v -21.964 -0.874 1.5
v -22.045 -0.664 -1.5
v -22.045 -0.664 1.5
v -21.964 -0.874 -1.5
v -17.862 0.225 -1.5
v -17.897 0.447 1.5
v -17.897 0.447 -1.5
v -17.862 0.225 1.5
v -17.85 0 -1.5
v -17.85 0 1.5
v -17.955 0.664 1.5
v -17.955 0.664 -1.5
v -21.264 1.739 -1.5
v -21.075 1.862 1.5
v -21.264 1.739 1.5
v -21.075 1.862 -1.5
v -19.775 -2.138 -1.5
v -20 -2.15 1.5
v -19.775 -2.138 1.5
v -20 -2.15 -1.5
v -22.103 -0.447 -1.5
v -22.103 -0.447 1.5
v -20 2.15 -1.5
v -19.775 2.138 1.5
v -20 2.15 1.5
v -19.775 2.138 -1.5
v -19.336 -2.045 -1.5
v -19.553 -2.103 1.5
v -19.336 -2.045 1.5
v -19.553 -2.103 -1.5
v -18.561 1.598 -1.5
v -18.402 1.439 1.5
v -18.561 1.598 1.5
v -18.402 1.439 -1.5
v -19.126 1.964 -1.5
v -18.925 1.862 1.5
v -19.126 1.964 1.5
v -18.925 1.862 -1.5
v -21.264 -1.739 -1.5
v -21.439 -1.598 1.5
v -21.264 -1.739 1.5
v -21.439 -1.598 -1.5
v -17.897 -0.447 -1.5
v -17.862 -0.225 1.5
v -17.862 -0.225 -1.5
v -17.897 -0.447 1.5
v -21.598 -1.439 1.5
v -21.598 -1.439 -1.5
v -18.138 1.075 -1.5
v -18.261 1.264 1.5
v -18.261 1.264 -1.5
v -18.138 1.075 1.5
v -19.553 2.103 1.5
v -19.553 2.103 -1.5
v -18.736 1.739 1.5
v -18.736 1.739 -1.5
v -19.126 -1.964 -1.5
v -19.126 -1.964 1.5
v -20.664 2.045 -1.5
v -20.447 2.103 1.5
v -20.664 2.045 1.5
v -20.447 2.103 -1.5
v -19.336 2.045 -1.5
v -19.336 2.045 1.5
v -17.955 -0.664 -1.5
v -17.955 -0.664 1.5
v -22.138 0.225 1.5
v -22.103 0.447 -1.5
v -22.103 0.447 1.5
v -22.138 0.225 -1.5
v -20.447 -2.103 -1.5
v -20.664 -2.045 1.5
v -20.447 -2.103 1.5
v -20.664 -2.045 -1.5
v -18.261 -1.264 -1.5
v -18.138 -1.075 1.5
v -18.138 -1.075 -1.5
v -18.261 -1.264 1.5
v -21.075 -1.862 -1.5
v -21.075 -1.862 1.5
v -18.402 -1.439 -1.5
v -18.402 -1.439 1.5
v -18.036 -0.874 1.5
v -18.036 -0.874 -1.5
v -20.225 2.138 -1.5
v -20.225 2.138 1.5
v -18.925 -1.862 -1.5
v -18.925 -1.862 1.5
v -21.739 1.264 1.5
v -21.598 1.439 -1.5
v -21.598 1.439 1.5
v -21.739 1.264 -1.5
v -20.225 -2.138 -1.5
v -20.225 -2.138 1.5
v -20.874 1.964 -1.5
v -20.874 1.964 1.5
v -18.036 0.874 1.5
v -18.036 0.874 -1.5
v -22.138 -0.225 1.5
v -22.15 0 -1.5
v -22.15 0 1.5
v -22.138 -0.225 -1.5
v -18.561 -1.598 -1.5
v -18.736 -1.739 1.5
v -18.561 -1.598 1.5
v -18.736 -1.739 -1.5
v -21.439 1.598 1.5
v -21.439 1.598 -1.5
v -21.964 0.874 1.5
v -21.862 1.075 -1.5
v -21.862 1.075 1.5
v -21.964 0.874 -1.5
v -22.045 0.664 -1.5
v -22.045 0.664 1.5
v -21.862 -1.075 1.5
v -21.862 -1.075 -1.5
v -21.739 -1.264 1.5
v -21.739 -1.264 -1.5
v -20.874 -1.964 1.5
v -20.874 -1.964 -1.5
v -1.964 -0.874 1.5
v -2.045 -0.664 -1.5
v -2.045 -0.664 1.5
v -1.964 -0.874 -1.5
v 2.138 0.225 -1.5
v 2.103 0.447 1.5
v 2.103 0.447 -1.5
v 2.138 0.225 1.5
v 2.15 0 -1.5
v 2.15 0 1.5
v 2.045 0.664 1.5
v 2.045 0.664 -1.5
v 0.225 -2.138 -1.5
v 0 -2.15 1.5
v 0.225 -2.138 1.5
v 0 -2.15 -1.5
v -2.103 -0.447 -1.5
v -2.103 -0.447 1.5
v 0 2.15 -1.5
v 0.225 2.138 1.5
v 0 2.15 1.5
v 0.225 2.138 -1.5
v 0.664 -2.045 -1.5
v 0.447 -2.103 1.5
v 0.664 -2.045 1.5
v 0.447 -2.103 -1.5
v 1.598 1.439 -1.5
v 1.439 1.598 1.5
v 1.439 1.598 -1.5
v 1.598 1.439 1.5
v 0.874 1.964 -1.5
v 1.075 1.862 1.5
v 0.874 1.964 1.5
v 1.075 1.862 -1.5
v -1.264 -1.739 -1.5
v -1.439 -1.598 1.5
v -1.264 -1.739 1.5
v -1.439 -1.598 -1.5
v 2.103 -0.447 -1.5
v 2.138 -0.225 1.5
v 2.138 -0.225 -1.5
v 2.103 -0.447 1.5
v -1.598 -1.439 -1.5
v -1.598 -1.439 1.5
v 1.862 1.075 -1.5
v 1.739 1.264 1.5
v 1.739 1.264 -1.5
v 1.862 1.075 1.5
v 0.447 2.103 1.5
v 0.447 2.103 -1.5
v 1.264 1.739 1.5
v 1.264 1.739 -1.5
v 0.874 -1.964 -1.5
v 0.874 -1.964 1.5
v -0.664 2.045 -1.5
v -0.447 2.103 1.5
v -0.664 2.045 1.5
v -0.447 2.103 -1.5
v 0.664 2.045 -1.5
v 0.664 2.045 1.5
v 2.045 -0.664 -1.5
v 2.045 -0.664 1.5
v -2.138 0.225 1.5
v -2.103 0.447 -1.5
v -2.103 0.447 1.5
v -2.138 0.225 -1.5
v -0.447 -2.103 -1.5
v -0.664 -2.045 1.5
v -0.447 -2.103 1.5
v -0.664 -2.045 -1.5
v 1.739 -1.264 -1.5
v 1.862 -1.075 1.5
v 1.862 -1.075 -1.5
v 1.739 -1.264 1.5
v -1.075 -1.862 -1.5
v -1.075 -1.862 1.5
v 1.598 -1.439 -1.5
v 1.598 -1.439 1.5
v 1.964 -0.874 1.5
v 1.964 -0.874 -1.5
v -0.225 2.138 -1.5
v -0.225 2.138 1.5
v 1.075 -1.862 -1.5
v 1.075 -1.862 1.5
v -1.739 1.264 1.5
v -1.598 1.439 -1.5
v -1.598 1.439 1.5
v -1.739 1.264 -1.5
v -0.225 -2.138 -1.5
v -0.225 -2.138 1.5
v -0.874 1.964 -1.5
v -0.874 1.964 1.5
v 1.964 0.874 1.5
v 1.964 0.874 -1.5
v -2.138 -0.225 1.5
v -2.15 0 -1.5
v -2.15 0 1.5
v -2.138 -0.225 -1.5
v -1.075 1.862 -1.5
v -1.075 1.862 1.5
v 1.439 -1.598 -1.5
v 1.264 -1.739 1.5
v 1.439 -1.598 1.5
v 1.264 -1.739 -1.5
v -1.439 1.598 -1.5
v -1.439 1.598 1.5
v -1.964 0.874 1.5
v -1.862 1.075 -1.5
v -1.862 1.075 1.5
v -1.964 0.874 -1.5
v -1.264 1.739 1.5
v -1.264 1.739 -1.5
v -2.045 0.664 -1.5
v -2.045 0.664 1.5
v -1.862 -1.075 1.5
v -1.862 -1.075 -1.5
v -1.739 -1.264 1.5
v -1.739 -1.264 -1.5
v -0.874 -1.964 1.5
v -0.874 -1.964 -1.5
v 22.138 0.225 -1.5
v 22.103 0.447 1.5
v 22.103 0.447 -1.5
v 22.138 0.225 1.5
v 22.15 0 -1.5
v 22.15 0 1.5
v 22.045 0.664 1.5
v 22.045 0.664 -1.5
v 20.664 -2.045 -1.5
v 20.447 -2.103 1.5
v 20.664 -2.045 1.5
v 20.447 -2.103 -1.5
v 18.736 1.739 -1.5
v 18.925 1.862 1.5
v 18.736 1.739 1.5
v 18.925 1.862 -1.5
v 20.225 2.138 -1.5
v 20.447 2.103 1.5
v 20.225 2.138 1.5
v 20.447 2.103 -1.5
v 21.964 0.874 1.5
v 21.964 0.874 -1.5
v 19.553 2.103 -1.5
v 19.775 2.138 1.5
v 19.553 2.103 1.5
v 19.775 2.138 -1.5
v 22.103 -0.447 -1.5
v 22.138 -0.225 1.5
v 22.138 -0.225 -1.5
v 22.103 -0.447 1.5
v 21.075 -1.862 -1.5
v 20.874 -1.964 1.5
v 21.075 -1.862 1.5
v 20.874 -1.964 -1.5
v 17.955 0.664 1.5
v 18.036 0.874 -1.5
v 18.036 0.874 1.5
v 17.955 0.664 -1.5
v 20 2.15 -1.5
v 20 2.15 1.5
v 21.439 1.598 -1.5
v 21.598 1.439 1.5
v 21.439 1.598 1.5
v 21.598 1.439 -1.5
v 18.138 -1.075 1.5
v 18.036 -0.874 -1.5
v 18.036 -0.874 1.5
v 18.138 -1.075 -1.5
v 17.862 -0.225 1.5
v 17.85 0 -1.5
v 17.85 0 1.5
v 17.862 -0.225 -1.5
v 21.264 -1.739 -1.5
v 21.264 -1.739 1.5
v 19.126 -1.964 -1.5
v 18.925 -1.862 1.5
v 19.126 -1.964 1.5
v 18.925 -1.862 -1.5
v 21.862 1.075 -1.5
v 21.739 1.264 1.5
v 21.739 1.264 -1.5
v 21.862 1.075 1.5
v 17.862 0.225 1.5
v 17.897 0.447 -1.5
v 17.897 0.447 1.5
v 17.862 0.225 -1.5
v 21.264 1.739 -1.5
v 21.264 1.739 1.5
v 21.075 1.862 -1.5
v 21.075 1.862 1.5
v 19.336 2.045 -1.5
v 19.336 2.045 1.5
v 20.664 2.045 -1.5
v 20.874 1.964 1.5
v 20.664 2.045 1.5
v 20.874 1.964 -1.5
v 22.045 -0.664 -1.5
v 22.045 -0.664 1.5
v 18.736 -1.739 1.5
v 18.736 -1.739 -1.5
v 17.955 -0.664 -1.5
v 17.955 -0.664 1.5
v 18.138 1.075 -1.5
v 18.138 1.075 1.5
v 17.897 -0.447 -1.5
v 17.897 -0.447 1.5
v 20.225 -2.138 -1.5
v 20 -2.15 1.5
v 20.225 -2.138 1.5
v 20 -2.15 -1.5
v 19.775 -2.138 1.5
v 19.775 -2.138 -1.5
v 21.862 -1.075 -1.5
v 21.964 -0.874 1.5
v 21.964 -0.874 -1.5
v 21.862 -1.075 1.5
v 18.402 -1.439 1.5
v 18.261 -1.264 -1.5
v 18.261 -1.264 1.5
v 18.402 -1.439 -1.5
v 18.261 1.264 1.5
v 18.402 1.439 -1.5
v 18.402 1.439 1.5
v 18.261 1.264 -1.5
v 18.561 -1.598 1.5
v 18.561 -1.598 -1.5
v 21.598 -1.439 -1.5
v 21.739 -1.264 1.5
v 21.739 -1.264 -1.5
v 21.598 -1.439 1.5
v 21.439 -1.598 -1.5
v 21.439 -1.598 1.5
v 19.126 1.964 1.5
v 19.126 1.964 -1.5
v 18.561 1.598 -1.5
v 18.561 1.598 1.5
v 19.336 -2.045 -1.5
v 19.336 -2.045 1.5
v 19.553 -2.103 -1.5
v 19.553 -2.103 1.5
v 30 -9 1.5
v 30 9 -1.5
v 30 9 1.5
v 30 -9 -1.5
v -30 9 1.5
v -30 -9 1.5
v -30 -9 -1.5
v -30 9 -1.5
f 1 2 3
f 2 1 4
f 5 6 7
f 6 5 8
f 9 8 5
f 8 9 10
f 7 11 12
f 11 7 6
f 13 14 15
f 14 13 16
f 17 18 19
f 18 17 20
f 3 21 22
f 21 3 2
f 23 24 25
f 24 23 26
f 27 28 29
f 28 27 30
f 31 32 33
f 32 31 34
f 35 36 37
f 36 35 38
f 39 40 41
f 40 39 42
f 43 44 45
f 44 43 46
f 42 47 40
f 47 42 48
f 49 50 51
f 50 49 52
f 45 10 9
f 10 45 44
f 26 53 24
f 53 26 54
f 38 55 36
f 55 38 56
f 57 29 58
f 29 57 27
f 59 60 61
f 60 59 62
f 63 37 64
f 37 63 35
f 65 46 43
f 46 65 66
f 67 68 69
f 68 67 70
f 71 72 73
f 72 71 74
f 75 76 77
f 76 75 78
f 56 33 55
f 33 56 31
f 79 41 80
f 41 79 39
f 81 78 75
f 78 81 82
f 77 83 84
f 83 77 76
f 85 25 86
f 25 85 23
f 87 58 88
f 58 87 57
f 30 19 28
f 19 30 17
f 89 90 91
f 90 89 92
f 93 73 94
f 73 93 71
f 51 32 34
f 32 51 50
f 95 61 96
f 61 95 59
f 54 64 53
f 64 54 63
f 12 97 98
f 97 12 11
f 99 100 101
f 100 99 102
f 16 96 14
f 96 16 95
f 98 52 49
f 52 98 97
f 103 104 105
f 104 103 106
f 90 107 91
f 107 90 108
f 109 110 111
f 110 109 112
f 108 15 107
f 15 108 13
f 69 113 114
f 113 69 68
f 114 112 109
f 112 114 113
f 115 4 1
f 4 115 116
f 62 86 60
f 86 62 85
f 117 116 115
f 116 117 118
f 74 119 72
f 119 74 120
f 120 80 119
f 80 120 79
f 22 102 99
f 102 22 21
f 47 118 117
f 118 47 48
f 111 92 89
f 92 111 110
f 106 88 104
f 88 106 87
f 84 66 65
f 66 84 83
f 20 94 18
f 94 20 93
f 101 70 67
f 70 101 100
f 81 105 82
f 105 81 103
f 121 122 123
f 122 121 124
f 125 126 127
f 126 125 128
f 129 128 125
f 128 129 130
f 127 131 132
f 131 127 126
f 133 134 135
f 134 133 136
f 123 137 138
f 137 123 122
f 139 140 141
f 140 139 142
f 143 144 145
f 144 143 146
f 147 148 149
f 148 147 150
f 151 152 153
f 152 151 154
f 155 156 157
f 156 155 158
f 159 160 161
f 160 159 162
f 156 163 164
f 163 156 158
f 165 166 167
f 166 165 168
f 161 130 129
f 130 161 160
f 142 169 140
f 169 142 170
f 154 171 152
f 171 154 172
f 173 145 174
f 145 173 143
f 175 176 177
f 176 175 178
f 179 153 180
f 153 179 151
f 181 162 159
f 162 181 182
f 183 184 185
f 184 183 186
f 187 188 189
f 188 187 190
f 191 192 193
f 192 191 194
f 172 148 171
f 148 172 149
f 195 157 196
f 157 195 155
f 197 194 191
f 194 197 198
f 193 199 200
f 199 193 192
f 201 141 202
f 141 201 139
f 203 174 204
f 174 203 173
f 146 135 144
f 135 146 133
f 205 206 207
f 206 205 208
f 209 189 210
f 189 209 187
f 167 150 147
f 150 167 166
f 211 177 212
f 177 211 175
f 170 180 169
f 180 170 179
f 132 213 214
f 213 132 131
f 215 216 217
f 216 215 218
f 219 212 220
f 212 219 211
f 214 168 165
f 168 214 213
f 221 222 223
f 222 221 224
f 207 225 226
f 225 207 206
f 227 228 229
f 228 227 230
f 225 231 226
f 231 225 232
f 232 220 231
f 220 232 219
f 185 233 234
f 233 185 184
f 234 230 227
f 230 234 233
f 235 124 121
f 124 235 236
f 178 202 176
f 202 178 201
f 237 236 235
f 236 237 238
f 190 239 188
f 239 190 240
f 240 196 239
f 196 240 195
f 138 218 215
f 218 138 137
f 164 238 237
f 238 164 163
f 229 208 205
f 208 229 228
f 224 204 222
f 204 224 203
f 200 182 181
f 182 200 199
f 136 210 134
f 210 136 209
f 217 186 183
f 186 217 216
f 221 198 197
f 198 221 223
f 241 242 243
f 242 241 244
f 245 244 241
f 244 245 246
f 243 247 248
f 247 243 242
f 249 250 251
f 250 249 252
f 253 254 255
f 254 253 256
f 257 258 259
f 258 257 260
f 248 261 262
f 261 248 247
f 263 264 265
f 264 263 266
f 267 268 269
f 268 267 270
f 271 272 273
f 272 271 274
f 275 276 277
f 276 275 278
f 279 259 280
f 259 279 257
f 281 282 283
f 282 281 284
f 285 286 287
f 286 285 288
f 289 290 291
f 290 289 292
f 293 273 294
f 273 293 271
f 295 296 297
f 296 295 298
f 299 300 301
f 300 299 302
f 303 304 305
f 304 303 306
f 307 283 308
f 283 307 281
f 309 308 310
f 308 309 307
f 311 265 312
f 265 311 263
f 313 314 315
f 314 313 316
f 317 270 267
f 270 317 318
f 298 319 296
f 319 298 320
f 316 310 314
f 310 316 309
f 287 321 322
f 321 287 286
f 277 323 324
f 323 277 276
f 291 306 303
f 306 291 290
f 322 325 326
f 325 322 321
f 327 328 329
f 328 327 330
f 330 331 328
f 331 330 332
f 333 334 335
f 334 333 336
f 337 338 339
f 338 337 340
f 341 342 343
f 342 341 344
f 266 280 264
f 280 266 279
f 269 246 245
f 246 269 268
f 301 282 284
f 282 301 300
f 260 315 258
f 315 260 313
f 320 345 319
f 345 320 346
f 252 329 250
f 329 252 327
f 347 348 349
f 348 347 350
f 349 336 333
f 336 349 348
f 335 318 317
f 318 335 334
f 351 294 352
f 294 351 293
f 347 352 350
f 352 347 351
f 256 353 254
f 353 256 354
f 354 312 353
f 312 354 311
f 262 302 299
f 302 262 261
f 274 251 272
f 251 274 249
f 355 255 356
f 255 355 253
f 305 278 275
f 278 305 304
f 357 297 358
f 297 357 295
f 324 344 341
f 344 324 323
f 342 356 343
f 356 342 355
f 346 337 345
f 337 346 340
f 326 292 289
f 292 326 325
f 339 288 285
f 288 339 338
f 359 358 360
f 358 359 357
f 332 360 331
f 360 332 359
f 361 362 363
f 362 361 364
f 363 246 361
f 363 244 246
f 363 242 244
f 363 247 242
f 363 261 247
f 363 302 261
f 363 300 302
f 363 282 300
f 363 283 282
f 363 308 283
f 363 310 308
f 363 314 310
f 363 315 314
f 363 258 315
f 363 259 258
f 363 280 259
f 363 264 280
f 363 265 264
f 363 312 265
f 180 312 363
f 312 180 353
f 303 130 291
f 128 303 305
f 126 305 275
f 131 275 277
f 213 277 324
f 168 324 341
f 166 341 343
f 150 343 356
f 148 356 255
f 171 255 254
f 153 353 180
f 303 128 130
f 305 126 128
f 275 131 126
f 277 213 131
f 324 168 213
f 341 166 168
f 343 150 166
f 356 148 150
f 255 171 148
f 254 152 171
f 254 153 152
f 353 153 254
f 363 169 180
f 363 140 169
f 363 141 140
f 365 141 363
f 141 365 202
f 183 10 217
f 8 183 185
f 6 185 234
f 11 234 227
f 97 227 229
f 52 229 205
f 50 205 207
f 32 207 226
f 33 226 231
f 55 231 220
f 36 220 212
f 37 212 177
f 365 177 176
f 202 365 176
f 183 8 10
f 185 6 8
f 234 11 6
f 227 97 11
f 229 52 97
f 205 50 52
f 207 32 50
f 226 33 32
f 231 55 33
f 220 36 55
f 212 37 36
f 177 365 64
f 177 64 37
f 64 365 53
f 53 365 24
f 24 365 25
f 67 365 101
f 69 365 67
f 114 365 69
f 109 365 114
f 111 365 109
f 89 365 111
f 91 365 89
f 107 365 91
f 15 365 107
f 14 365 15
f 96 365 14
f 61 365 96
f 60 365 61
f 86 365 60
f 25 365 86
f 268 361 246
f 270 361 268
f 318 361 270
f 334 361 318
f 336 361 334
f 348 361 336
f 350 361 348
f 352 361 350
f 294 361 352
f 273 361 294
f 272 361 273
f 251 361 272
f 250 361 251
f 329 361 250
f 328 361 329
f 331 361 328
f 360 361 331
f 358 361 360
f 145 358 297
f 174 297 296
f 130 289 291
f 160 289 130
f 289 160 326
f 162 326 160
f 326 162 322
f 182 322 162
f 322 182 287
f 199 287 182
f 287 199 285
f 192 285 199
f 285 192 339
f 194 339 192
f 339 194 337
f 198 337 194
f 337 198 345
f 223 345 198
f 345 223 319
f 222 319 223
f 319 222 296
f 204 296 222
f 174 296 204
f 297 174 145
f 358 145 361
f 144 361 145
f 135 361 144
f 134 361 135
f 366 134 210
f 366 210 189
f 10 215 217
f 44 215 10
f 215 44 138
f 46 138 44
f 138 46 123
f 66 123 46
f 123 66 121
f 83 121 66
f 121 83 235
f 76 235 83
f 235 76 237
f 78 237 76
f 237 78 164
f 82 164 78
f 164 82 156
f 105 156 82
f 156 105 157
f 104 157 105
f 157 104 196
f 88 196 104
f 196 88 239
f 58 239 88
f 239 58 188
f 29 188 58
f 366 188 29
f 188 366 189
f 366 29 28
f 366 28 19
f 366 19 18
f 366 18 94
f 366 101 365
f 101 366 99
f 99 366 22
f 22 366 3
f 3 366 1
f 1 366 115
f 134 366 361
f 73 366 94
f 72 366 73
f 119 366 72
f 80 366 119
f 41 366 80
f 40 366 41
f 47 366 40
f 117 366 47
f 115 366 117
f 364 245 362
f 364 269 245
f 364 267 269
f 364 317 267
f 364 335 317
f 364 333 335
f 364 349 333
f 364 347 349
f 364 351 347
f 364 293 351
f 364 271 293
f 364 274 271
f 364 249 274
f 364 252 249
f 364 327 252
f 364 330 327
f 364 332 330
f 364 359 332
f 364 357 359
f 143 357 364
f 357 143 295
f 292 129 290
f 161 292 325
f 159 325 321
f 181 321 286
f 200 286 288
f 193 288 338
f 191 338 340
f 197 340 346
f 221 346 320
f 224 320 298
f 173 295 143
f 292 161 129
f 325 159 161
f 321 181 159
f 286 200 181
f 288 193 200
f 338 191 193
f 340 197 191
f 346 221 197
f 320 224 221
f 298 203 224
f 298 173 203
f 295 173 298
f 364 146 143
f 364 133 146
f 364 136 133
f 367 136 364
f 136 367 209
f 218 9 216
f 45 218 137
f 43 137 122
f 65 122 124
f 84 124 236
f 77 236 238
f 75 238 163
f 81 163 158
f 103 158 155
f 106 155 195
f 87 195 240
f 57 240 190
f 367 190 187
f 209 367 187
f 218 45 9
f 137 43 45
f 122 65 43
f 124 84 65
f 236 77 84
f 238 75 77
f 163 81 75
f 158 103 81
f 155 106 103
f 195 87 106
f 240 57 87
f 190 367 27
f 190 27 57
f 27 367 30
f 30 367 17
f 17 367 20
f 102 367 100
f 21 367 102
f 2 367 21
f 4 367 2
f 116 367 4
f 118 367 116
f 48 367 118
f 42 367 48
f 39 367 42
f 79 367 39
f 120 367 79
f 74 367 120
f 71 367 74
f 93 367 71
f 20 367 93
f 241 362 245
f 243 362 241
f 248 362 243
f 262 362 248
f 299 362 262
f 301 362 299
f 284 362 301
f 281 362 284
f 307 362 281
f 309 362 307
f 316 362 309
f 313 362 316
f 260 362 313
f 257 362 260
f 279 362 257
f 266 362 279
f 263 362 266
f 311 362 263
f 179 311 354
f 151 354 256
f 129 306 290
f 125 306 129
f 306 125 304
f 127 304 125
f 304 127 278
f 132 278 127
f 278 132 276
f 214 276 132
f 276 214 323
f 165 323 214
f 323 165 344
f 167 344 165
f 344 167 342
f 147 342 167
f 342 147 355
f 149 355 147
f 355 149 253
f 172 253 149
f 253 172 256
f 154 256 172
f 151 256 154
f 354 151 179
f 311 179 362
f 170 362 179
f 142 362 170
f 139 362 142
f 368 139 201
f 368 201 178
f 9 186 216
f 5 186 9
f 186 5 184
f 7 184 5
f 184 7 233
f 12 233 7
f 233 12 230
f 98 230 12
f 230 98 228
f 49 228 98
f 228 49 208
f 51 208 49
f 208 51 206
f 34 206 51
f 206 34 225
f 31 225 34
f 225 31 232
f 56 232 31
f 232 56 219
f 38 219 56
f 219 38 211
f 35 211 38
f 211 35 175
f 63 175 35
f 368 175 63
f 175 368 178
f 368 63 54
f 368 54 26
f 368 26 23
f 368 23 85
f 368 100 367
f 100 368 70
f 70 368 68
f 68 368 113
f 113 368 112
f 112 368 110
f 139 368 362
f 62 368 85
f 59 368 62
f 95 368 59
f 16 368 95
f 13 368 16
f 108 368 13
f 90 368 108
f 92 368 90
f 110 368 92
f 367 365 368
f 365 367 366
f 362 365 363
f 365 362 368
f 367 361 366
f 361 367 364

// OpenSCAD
// Linear rail spacer strip.
$fn = 60;
eps = 0.02;
length = 60;
width = 18;
thickness = 3;
hole_pitch = 20;
difference() {
    cube([length,width,thickness],center=true);
    for (x=[-length/2+10:hole_pitch:length/2-10]) translate([x,0,-thickness/2-eps]) cylinder(d=4.3,h=thickness+2*eps);
}
